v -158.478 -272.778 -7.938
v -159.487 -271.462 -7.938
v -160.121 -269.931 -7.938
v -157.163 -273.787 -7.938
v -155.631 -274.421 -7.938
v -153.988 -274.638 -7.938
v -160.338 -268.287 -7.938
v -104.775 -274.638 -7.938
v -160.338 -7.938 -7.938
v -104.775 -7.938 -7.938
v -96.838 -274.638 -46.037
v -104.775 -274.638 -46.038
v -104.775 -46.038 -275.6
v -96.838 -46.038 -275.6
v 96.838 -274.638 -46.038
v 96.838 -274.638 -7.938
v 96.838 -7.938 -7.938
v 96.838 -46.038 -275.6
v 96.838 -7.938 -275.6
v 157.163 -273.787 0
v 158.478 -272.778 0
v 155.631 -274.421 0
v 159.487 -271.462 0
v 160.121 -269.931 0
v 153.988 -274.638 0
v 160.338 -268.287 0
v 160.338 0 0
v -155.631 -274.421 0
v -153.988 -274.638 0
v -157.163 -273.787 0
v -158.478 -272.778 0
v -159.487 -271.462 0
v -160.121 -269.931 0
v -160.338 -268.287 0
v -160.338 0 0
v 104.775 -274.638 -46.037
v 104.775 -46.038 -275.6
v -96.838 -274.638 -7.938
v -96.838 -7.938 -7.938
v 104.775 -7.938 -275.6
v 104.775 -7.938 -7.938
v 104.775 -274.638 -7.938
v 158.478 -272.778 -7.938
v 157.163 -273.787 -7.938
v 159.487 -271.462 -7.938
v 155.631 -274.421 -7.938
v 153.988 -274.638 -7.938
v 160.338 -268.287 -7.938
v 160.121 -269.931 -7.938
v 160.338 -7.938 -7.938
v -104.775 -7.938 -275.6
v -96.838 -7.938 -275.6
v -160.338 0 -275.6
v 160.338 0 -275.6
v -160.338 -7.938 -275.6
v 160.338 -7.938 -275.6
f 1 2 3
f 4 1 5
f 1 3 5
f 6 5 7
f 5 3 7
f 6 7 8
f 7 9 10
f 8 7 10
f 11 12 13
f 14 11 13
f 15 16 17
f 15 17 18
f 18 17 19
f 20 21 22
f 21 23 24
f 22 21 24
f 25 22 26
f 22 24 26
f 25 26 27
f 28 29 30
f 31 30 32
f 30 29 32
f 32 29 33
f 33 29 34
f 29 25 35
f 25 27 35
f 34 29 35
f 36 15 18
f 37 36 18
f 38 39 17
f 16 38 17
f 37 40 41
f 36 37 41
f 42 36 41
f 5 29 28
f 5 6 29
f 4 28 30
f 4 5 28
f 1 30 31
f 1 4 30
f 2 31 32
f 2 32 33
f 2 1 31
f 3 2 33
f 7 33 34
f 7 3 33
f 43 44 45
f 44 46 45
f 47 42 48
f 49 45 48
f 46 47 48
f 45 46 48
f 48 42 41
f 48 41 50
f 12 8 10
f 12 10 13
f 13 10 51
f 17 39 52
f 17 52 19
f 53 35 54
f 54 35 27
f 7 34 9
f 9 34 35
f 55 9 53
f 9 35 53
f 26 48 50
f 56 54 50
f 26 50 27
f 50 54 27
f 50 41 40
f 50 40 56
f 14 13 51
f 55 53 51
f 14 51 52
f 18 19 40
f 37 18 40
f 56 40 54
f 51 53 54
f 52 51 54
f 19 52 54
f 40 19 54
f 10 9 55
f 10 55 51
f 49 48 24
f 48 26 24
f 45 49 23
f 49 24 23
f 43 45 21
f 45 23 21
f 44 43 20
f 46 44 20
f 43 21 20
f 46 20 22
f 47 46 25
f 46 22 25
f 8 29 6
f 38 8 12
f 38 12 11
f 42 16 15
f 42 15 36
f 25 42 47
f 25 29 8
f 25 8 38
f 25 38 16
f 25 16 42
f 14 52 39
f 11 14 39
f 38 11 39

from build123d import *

# Parameters (mm, degrees)
F0_W     = 320.675
F0_H     = 275.60016
F1_DEPTH = 7.9375
F4_DEPTH = 266.7
F6_DEPTH = 265.1135
F8_R     = 6.35


with BuildPart() as f1:
    # F0 (on Front) → F1 (new body)
    with BuildSketch(Plane.XZ):
        with Locations((0, -137.80008)):
            Rectangle(F0_W, F0_H)
    extrude(amount=F1_DEPTH)

    # F3 (on face) → F4 (join)
    with BuildSketch(Plane.XZ.offset(7.9375)):
        Polygon((160.3375, 0), (-160.3375, 0), (-160.3375, -7.9375), (-104.775, -7.9375), (-104.775, -275.60016), (-96.8375, -275.60016), (-96.8375, -7.9375), (96.8375, -7.9375), (96.8375, -275.60016), (104.775, -275.60016), (104.775, -7.9375), (160.3375, -7.9375), align=None)
    extrude(amount=F4_DEPTH)

    # F5 (on face) → F6 (cut, through all)
    with BuildSketch(Plane(origin=(-104.775, 0, 0), x_dir=(0, -1, 0), z_dir=(-1, 0, 0))):
        Polygon((274.6375, -46.0375), (46.0375, -275.60016), (274.6375, -275.60016), align=None)
    extrude(amount=-F6_DEPTH, mode=Mode.SUBTRACT)

    # F8
    f8_edges = [f1.edges().sort_by_distance(p)[0] for p in [
        (-160.3375, -274.6375, -3.96875),
        (160.3375, -274.6375, -3.96875),
    ]]
    fillet(f8_edges, radius=F8_R)


solid = f1.part
